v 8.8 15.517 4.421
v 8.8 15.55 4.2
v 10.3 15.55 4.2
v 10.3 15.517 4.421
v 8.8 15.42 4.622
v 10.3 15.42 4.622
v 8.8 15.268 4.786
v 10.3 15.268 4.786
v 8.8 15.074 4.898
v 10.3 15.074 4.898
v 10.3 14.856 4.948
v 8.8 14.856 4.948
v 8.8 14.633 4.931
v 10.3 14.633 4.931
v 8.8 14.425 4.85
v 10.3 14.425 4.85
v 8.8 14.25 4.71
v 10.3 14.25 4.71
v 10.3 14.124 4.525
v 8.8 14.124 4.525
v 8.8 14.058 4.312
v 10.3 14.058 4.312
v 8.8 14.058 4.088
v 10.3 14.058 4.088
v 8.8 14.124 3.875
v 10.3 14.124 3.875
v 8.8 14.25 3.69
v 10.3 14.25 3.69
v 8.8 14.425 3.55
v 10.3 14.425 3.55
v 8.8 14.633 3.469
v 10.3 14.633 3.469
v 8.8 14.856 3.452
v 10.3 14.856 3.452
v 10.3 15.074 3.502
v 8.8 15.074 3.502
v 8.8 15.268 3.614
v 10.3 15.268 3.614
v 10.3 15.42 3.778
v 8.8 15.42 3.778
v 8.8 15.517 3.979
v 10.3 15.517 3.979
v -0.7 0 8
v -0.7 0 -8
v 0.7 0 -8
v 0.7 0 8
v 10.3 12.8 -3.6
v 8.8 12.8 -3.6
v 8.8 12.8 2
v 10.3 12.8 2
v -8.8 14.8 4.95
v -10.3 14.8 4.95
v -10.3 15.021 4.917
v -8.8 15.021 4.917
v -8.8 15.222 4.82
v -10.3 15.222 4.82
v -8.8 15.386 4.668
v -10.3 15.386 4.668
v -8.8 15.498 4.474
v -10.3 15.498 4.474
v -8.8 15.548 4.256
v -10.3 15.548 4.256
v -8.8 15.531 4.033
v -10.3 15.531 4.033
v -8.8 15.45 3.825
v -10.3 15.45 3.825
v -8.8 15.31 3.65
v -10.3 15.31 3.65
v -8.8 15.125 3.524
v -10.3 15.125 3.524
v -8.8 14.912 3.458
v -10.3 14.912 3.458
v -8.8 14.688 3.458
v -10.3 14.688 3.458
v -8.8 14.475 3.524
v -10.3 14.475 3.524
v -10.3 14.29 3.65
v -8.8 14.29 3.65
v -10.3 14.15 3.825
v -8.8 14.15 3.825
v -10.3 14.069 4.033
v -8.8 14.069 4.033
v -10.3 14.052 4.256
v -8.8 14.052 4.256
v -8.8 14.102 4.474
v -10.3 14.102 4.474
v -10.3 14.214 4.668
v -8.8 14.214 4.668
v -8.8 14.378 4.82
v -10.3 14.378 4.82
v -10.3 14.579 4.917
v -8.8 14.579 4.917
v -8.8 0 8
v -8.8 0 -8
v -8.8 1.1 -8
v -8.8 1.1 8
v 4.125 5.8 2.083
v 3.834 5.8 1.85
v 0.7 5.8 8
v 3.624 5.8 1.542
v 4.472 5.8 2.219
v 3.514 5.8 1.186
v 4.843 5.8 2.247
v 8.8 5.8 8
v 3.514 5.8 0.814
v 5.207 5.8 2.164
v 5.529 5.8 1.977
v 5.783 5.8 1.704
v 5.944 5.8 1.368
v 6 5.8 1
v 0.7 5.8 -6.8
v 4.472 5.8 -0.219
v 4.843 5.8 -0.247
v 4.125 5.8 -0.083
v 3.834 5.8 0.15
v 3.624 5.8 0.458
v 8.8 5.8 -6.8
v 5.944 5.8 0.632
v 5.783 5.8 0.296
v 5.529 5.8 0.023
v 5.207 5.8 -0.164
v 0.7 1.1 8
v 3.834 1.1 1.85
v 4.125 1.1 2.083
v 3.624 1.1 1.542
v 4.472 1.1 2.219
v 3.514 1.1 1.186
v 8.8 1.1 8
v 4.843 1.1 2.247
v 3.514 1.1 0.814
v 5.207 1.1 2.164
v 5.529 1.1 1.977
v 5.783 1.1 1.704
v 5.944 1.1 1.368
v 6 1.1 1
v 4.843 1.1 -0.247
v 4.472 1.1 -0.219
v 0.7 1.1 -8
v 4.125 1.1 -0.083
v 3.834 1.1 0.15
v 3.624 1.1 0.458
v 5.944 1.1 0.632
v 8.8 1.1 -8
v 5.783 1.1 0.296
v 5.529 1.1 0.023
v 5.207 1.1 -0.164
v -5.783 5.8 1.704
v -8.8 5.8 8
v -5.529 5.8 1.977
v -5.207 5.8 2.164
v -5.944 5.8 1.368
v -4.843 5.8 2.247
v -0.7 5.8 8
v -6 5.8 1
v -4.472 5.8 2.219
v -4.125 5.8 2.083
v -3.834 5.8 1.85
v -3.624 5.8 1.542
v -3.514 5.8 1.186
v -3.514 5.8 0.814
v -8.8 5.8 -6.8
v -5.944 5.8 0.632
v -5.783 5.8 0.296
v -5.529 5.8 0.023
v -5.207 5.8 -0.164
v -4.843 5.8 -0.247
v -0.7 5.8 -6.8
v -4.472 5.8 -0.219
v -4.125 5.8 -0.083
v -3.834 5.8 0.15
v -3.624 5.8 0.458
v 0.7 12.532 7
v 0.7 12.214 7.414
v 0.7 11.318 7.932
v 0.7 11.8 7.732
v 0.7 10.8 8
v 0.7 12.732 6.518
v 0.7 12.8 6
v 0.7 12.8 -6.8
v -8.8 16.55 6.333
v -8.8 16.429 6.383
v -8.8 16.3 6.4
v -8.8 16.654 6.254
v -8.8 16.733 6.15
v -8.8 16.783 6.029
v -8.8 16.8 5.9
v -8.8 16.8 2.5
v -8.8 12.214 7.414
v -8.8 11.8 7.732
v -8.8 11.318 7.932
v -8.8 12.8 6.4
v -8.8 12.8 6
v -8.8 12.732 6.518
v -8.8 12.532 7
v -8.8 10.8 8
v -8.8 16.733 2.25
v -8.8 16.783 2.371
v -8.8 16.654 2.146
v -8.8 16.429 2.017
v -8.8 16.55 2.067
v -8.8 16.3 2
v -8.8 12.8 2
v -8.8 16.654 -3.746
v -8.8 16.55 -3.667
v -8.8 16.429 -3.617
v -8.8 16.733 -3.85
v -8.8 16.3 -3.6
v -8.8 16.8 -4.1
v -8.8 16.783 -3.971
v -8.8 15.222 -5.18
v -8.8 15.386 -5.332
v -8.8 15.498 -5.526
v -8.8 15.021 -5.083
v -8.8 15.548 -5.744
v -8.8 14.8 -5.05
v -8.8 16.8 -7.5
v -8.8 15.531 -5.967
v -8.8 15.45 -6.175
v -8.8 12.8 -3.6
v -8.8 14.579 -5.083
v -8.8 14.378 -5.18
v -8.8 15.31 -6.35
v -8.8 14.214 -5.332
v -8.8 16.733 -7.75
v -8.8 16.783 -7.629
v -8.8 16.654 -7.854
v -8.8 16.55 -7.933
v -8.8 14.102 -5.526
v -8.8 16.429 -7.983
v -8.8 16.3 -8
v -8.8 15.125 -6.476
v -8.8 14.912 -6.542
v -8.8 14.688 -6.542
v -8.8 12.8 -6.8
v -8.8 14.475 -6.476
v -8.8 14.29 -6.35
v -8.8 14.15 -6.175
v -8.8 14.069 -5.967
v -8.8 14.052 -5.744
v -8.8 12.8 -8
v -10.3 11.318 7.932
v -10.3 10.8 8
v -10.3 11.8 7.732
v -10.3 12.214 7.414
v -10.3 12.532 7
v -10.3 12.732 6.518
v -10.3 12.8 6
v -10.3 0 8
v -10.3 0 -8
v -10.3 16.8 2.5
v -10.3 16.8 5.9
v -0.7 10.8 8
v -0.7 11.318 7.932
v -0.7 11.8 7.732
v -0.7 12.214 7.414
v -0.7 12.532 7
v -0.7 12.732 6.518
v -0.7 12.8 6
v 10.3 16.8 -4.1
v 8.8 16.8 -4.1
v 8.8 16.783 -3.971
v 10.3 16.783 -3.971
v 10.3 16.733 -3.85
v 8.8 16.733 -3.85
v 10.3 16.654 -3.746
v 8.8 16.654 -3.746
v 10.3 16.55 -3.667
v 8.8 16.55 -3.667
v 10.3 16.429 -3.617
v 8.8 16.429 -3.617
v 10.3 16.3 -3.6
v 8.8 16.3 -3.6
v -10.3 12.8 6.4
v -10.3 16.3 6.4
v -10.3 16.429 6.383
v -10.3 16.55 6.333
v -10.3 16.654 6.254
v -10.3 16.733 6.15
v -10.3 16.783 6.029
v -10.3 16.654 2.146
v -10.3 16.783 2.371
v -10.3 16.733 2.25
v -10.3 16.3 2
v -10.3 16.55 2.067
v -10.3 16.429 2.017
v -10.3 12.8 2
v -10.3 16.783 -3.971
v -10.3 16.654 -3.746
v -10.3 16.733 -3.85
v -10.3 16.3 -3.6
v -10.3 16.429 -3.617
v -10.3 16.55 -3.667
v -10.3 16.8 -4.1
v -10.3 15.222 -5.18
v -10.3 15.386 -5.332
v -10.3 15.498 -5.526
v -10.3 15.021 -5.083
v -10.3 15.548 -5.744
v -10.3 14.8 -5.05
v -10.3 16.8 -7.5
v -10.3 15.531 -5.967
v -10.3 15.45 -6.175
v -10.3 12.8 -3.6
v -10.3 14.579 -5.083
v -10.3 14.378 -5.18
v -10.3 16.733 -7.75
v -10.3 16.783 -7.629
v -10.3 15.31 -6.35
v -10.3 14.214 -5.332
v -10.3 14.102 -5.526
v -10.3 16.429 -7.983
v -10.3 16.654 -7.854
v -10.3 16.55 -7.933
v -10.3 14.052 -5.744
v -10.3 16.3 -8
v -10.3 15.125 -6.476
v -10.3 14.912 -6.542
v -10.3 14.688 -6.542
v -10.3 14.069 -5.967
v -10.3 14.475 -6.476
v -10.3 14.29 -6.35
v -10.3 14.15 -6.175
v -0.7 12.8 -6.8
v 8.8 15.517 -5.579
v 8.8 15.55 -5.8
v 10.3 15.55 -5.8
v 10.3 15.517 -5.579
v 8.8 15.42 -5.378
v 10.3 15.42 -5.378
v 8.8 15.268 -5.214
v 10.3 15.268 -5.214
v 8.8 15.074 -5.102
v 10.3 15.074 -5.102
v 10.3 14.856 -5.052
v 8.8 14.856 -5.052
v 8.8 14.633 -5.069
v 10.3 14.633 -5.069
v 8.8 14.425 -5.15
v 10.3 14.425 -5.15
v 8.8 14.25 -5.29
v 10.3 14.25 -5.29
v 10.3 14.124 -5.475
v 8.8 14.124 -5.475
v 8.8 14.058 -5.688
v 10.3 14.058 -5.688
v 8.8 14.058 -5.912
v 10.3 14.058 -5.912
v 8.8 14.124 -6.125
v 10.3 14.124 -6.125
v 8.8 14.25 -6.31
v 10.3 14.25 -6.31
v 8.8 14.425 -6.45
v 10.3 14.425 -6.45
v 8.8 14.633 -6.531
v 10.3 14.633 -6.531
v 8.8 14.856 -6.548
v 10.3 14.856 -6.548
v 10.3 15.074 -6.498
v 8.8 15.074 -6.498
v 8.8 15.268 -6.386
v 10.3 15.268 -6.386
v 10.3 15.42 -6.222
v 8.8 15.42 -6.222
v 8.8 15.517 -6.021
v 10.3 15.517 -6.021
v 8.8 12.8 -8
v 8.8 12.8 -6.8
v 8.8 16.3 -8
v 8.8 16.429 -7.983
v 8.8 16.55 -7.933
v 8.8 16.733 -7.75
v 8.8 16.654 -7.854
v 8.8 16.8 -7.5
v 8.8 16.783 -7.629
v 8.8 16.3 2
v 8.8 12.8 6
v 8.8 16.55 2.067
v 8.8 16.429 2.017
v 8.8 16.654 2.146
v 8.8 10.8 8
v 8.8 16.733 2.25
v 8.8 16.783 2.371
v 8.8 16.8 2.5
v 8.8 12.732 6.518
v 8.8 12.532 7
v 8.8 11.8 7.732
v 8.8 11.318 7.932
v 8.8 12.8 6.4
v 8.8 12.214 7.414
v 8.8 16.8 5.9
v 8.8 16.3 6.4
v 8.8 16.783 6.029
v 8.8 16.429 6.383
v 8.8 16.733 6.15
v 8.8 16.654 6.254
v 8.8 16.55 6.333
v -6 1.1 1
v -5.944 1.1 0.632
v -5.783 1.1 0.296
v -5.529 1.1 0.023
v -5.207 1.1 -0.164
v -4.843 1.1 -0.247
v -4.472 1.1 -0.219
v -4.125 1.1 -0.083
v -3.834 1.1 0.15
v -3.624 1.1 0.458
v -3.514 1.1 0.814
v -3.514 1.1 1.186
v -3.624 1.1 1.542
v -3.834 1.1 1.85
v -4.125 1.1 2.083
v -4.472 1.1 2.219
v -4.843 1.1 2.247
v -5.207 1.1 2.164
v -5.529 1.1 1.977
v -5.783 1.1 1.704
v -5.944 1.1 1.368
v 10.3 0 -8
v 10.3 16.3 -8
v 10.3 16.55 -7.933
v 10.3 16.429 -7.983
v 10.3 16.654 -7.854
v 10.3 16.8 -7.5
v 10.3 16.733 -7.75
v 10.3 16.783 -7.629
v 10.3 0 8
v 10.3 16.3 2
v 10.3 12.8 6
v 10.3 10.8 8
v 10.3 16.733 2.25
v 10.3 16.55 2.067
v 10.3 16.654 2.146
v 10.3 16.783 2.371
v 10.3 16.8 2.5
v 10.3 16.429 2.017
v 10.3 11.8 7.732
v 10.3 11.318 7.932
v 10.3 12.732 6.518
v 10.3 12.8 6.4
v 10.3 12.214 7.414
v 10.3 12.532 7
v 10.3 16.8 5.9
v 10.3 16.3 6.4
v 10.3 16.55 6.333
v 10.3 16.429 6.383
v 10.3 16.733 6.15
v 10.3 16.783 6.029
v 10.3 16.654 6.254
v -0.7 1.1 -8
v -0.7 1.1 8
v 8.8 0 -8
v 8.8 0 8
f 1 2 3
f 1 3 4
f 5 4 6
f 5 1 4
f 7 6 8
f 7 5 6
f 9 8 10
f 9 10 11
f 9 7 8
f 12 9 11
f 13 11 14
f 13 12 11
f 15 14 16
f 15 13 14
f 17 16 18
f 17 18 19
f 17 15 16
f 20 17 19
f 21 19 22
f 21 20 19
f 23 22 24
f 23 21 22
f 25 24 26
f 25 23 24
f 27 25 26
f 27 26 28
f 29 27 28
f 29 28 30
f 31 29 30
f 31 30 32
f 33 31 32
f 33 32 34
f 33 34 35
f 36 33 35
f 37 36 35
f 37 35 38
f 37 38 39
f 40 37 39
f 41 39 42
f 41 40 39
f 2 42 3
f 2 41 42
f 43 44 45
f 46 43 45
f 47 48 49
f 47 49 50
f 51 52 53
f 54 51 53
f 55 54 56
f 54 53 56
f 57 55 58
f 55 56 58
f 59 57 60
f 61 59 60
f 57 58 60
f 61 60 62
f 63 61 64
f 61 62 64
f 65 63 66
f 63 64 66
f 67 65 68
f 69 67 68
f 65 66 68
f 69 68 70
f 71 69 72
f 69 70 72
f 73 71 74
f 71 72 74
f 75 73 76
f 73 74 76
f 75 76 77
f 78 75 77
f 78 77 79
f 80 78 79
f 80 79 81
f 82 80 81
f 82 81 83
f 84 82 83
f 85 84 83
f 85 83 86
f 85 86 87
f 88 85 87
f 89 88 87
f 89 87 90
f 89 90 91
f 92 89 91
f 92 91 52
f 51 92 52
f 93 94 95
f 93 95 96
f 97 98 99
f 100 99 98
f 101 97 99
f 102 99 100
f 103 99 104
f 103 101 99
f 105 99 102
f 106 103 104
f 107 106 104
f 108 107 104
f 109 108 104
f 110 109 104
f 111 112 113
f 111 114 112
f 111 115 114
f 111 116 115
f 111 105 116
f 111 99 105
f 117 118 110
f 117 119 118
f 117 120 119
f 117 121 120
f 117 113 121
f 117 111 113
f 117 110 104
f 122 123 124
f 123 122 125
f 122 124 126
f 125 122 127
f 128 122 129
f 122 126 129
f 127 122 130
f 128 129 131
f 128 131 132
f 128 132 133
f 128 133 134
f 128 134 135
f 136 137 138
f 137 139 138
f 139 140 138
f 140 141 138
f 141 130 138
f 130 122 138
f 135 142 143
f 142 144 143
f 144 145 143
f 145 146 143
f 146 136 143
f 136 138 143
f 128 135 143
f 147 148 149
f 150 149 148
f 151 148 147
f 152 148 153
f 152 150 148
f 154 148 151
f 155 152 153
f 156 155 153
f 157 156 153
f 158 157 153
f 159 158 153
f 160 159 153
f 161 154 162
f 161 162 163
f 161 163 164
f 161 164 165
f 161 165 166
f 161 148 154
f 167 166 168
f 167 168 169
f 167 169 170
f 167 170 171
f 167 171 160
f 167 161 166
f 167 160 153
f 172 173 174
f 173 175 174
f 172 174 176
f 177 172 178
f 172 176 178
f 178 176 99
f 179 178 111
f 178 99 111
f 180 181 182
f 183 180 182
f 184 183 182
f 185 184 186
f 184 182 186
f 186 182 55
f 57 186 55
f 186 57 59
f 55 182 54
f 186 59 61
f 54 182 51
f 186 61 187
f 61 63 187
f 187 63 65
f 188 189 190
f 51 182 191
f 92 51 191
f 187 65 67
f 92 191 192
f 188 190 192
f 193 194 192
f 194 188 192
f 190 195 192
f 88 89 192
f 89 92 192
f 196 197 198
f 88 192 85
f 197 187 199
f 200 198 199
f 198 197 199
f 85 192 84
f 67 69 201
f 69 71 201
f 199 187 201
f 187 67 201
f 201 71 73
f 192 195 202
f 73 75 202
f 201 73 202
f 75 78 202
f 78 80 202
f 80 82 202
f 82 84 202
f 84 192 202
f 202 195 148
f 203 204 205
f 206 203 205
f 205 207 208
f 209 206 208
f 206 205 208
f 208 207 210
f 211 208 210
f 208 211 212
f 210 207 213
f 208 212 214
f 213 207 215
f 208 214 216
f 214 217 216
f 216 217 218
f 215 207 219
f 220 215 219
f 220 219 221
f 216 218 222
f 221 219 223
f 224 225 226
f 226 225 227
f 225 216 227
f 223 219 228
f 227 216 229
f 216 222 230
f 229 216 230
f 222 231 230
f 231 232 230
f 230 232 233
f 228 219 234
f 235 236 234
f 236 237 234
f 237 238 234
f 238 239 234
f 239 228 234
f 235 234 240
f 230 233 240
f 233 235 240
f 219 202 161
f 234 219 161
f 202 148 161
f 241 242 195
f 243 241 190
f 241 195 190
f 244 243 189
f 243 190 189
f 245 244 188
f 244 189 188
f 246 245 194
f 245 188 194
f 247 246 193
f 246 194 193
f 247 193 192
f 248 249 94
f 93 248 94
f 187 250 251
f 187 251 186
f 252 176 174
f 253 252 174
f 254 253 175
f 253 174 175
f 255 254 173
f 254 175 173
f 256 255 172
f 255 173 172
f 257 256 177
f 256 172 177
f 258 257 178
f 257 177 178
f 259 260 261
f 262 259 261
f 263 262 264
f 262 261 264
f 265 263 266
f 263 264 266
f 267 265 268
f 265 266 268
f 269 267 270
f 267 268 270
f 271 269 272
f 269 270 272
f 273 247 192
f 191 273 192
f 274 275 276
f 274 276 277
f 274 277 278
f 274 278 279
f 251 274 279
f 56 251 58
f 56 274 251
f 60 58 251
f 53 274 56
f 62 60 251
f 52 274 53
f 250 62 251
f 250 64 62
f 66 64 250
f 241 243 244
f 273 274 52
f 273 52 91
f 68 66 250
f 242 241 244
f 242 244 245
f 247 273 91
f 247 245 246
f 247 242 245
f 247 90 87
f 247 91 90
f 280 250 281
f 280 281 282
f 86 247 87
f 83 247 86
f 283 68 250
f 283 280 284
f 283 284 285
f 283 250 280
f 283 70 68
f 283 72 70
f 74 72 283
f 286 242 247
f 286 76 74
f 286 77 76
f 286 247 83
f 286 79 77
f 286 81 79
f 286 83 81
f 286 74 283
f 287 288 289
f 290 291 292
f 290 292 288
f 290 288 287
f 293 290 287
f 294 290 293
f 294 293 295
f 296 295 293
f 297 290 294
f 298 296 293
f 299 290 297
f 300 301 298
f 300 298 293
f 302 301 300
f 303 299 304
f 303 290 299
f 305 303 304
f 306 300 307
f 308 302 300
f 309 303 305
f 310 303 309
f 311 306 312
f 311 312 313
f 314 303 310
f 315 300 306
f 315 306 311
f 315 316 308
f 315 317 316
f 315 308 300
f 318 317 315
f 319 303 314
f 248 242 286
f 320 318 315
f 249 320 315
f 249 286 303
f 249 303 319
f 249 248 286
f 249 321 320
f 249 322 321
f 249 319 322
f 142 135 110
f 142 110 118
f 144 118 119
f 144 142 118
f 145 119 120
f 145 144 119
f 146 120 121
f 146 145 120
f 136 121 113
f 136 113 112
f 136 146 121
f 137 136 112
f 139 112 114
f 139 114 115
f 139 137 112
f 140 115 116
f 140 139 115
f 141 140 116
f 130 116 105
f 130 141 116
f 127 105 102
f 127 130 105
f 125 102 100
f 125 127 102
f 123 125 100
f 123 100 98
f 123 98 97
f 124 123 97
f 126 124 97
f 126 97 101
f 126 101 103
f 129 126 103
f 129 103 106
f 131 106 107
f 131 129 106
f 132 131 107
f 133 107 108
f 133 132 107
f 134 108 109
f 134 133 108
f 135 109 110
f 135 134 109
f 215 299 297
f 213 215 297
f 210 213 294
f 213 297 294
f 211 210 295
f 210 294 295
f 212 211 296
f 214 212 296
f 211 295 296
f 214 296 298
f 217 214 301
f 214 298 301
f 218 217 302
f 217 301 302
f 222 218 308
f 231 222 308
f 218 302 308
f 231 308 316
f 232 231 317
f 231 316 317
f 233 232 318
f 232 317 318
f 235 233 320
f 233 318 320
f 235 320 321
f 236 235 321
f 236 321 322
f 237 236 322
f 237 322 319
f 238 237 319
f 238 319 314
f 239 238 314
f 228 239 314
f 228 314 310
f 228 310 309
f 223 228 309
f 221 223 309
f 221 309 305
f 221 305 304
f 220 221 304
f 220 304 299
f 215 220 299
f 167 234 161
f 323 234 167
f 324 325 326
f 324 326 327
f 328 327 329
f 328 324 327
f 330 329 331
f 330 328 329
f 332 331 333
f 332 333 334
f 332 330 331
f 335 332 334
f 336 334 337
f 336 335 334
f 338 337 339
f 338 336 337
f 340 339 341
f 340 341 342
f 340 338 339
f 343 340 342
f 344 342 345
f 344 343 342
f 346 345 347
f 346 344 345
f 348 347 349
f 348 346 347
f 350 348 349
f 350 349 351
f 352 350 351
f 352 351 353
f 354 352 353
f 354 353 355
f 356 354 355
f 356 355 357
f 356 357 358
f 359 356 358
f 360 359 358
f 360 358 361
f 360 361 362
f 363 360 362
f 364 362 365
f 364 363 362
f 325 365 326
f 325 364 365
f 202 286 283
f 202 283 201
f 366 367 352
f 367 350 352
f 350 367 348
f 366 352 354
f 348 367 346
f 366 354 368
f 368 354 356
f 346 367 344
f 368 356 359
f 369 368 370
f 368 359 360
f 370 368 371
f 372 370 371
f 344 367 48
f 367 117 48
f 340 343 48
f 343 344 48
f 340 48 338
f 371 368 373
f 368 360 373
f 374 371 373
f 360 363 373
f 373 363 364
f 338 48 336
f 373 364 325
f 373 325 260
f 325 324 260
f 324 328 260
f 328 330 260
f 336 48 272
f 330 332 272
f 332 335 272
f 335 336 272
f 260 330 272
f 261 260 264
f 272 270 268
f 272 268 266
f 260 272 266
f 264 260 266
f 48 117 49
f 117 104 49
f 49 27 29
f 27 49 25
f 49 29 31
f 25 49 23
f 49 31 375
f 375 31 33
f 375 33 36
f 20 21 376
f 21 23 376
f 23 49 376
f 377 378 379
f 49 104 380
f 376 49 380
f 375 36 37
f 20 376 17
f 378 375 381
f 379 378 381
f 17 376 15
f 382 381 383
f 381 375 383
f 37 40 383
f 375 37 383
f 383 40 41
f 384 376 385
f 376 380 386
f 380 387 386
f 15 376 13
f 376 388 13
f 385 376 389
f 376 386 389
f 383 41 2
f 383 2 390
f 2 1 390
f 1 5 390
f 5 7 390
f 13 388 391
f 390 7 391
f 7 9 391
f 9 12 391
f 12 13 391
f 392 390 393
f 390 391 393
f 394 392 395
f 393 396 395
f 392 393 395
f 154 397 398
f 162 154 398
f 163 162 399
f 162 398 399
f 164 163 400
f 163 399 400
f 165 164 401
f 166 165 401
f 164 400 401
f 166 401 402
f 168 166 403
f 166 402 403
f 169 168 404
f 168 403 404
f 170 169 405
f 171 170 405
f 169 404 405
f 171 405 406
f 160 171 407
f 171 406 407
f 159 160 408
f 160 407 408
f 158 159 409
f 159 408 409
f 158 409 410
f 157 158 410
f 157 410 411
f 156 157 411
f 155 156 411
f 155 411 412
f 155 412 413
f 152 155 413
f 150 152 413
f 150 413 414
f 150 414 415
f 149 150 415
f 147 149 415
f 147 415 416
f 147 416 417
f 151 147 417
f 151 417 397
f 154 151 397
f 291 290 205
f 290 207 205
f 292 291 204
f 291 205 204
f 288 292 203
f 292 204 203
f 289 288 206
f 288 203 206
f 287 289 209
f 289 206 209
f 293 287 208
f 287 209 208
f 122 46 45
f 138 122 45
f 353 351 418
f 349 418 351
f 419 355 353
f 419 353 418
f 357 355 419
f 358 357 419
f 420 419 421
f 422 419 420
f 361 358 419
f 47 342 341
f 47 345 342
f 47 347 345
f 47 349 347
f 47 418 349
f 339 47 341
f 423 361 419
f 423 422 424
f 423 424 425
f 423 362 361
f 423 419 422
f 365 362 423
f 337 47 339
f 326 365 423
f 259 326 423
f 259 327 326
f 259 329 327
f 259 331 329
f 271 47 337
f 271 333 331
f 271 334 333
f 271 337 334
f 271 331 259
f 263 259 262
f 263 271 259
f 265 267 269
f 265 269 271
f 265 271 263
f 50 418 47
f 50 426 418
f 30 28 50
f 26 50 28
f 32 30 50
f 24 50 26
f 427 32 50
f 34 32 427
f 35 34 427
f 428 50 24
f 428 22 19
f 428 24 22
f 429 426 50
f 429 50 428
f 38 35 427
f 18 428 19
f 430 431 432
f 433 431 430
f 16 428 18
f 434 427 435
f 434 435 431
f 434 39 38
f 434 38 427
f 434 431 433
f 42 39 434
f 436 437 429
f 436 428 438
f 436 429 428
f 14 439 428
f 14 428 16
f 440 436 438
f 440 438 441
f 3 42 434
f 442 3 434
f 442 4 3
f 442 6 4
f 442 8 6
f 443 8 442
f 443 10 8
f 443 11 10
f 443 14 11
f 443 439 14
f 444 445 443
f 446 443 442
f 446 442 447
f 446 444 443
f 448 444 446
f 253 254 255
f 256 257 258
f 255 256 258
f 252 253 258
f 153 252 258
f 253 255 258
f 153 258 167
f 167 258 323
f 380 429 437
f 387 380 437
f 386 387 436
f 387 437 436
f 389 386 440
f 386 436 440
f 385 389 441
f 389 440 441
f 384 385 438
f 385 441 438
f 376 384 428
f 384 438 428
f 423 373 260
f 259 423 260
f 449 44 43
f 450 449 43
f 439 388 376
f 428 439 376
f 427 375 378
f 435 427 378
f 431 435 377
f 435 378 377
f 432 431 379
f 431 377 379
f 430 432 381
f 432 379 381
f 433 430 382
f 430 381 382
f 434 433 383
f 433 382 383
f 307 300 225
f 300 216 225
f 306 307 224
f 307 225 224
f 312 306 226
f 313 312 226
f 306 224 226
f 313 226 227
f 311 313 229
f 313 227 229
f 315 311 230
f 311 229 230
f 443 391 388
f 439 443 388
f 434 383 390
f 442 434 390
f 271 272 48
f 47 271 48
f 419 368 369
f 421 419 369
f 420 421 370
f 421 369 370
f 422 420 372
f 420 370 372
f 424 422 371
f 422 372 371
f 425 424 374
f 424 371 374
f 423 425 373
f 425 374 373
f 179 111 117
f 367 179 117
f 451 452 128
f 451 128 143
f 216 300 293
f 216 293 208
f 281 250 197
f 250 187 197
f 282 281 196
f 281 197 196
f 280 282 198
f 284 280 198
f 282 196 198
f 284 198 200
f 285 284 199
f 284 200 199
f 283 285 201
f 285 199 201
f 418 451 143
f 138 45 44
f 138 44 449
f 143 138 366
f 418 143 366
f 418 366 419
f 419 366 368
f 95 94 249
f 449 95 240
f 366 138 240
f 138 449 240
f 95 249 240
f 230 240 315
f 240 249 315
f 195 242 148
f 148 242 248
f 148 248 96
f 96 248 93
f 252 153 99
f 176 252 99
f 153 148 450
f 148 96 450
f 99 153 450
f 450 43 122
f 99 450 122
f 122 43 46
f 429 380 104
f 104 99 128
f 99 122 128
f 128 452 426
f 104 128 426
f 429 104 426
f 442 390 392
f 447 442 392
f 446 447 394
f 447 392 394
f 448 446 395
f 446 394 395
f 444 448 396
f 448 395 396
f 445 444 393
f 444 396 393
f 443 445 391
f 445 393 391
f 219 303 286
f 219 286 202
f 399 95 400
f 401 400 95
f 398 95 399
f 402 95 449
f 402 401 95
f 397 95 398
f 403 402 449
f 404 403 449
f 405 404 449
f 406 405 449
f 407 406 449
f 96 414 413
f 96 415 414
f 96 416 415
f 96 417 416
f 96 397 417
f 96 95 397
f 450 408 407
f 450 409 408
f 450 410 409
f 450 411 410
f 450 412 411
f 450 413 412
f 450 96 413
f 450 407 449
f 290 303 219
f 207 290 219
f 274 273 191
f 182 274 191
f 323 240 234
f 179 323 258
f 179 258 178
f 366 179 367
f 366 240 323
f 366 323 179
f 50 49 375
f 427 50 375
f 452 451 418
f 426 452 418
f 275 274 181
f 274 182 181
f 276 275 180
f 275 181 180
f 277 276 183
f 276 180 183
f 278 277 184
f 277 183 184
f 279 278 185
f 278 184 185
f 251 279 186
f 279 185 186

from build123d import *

# Parameters (mm, degrees)
SKETCH1_W                 = 20.6
SKETCH1_H                 = 16
BOSS_EXTRUDE1_DEPTH       = 12.8
SKETCH2_W                 = 8.1
SKETCH2_H                 = 16
BOTTOM_CUT_DEPTH          = 1.1
FILL_PATTERN1_OUTLINE_W   = 8.1
FILL_PATTERN1_OUTLINE_H   = 16
FILL_PATTERN1_DEPTH       = 1.1
FILLET1_R                 = 2
SKETCH3_W                 = 8.1
SKETCH3_H                 = 14.8
TOP_CUT_DEPTH             = 7
M3X0_5_TAPPED_HOLE1_D     = 2.5
FILL_START                = 5.8
FILL_PATTERN2_OUTLINE_W   = 8.1
FILL_PATTERN2_OUTLINE_H   = 14.8
FILL_PATTERN2_DEPTH       = 7
FILL_START_2              = 1.1
FILL_PATTERN2_2_OUTLINE_R = 1.25
FILL_PATTERN2_2_DEPTH     = 4.7
SKETCH7_W                 = 1.5
SKETCH7_H                 = 4.4
BOSS_EXTRUDE2_DEPTH       = 4
CUT_EXTRUDE1_REACH        = 29.76
SKETCH8_R                 = 0.75
FILLET2_R                 = 0.5
LPATTERN1_COUNT           = 2
LPATTERN1_PITCH           = 10
FILLET2_OF_LPATTERN1_R    = 0.5
MIRROR1_START             = 8.8
MIRROR1_OUTLINE_R         = 0.75
MIRROR1_DEPTH             = 1.5


# Read off the part's stored shape, not the designer's step: Fill Pattern1, Fill Pattern2, Mirror1
with BuildPart() as part:
    # Sketch1 → Boss-Extrude1 (new body)
    with BuildSketch(Plane(origin=(0, 0, 0), x_dir=(1, 0, 0), z_dir=(0, 1, 0))):
        Rectangle(SKETCH1_W, SKETCH1_H)
    extrude(amount=BOSS_EXTRUDE1_DEPTH)

    # Sketch2 → BOTTOM CUT (cut)
    with BuildSketch(Plane.XZ):
        with Locations((-4.75, 0)):
            Rectangle(SKETCH2_W, SKETCH2_H)
    extrude(amount=-BOTTOM_CUT_DEPTH, mode=Mode.SUBTRACT)

    # Fill Pattern1 outline → Fill Pattern1 (cut)
    with BuildSketch(Plane(origin=(0, 0, 0), x_dir=(1, 0, 0), z_dir=(0, 1, 0))):
        with Locations((4.75, 0)):
            Rectangle(FILL_PATTERN1_OUTLINE_W, FILL_PATTERN1_OUTLINE_H)
    extrude(amount=FILL_PATTERN1_DEPTH, mode=Mode.SUBTRACT)

    # Fillet1
    fillet1_edges = [part.edges().sort_by_distance(p)[0] for p in [
        (0, 12.8, 8),
    ]]
    fillet(fillet1_edges, radius=FILLET1_R)

    # Sketch3 → TOP CUT (cut)
    with BuildSketch(Plane(origin=(0, 12.8, 0), x_dir=(1, 0, 0), z_dir=(0, 1, 0))):
        with Locations((-4.75, -0.6)):
            Rectangle(SKETCH3_W, SKETCH3_H)
    extrude(amount=-TOP_CUT_DEPTH, mode=Mode.SUBTRACT)

    # M3x0.5 Tapped Hole1 (through all)
    with Locations(Plane(origin=(0, 5.8, 0), x_dir=(1, 0, 0), z_dir=(0, 1, 0))):
        with Locations((-4.75, -1)):
            Hole(M3X0_5_TAPPED_HOLE1_D / 2)

    # Fill Pattern2 outline → Fill Pattern2 (cut)
    with BuildSketch(Plane(origin=(0, 0, 0), x_dir=(1, 0, 0), z_dir=(0, 1, 0)).offset(FILL_START)):
        with Locations((4.75, -0.6)):
            Rectangle(FILL_PATTERN2_OUTLINE_W, FILL_PATTERN2_OUTLINE_H)
    extrude(amount=FILL_PATTERN2_DEPTH, mode=Mode.SUBTRACT)

    # Fill Pattern2 2 outline → Fill Pattern2 2 (cut)
    with BuildSketch(Plane(origin=(0, 0, 0), x_dir=(1, 0, 0), z_dir=(0, 1, 0)).offset(FILL_START_2)):
        with Locations((4.75, -1)):
            Circle(FILL_PATTERN2_2_OUTLINE_R)
    extrude(amount=FILL_PATTERN2_2_DEPTH, mode=Mode.SUBTRACT)

    # Sketch7 → Boss-Extrude2 (add)
    with BuildSketch(Plane(origin=(0, 12.8, 0), x_dir=(1, 0, 0), z_dir=(0, 1, 0))):
        with Locations((-9.55, 5.8)):
            Rectangle(SKETCH7_W, SKETCH7_H)
    boss_extrude2 = extrude(amount=BOSS_EXTRUDE2_DEPTH)

    # Sketch8 → Cut-Extrude1 (cut, up to next)
    with BuildSketch(Plane.ZY.offset(10.3), mode=Mode.PRIVATE) as cut_extrude1_sk1:
        with Locations((-5.8, 14.8)):
            Circle(SKETCH8_R)
    cut_extrude1_tool1 = extrude(cut_extrude1_sk1.sketch, amount=-CUT_EXTRUDE1_REACH, mode=Mode.PRIVATE) & part.part
    cut_extrude1 = cut_extrude1_tool1.solids().sort_by_distance((-10.3, 14.8, -5.8))[0]
    add(cut_extrude1, mode=Mode.SUBTRACT)

    # Fillet2
    fillet2_edges = [part.edges().sort_by_distance(p)[0] for p in [
        (-9.55, 16.8, -3.6),
        (-9.55, 16.8, -8),
    ]]
    fillet(fillet2_edges, radius=FILLET2_R)

    # LPattern1: Boss-Extrude2, Cut-Extrude1 ×2
    with Locations(*[(0, 0, i * LPATTERN1_PITCH) for i in range(1, LPATTERN1_COUNT)]):
        add(boss_extrude2)
        add(cut_extrude1, mode=Mode.SUBTRACT)

    # Fillet2 of LPattern1
    fillet2_of_lpattern1_edges = [part.edges().sort_by_distance(p)[0] for p in [
        (-9.55, 16.8, 6.4),
        (-9.55, 16.8, 2),
    ]]
    fillet(fillet2_of_lpattern1_edges, radius=FILLET2_OF_LPATTERN1_R)

    # Mirror1 outline → Mirror1 (add)
    # profile 1 of 2: a face of its own
    with BuildSketch(Plane.YZ.offset(MIRROR1_START)):
        with BuildLine():
            ThreePointArc((16.8, -4.1), (16.653553391, -3.746446609), (16.3, -3.6))
            Line((16.3, -3.6), (12.8, -3.6))
            Line((12.8, -3.6), (12.8, -8))
            Line((12.8, -8), (16.3, -8))
            ThreePointArc((16.3, -8), (16.653553391, -7.853553391), (16.8, -7.5))
            Line((16.8, -7.5), (16.8, -4.1))
        make_face()
        with Locations((14.8, -5.8)):
            Circle(MIRROR1_OUTLINE_R, mode=Mode.SUBTRACT)
    # profile 2 of 2: a face of its own
    with BuildSketch(Plane.YZ.offset(MIRROR1_START)):
        with BuildLine():
            Line((12.8, 6.4), (12.8, 2))
            Line((12.8, 2), (16.3, 2))
            ThreePointArc((16.3, 2), (16.653553391, 2.146446609), (16.8, 2.5))
            Line((16.8, 2.5), (16.8, 5.9))
            ThreePointArc((16.8, 5.9), (16.653553391, 6.253553391), (16.3, 6.4))
            Line((16.3, 6.4), (12.8, 6.4))
        make_face()
        with Locations((14.8, 4.2)):
            Circle(MIRROR1_OUTLINE_R, mode=Mode.SUBTRACT)
    extrude(amount=MIRROR1_DEPTH)


solid = part.part
